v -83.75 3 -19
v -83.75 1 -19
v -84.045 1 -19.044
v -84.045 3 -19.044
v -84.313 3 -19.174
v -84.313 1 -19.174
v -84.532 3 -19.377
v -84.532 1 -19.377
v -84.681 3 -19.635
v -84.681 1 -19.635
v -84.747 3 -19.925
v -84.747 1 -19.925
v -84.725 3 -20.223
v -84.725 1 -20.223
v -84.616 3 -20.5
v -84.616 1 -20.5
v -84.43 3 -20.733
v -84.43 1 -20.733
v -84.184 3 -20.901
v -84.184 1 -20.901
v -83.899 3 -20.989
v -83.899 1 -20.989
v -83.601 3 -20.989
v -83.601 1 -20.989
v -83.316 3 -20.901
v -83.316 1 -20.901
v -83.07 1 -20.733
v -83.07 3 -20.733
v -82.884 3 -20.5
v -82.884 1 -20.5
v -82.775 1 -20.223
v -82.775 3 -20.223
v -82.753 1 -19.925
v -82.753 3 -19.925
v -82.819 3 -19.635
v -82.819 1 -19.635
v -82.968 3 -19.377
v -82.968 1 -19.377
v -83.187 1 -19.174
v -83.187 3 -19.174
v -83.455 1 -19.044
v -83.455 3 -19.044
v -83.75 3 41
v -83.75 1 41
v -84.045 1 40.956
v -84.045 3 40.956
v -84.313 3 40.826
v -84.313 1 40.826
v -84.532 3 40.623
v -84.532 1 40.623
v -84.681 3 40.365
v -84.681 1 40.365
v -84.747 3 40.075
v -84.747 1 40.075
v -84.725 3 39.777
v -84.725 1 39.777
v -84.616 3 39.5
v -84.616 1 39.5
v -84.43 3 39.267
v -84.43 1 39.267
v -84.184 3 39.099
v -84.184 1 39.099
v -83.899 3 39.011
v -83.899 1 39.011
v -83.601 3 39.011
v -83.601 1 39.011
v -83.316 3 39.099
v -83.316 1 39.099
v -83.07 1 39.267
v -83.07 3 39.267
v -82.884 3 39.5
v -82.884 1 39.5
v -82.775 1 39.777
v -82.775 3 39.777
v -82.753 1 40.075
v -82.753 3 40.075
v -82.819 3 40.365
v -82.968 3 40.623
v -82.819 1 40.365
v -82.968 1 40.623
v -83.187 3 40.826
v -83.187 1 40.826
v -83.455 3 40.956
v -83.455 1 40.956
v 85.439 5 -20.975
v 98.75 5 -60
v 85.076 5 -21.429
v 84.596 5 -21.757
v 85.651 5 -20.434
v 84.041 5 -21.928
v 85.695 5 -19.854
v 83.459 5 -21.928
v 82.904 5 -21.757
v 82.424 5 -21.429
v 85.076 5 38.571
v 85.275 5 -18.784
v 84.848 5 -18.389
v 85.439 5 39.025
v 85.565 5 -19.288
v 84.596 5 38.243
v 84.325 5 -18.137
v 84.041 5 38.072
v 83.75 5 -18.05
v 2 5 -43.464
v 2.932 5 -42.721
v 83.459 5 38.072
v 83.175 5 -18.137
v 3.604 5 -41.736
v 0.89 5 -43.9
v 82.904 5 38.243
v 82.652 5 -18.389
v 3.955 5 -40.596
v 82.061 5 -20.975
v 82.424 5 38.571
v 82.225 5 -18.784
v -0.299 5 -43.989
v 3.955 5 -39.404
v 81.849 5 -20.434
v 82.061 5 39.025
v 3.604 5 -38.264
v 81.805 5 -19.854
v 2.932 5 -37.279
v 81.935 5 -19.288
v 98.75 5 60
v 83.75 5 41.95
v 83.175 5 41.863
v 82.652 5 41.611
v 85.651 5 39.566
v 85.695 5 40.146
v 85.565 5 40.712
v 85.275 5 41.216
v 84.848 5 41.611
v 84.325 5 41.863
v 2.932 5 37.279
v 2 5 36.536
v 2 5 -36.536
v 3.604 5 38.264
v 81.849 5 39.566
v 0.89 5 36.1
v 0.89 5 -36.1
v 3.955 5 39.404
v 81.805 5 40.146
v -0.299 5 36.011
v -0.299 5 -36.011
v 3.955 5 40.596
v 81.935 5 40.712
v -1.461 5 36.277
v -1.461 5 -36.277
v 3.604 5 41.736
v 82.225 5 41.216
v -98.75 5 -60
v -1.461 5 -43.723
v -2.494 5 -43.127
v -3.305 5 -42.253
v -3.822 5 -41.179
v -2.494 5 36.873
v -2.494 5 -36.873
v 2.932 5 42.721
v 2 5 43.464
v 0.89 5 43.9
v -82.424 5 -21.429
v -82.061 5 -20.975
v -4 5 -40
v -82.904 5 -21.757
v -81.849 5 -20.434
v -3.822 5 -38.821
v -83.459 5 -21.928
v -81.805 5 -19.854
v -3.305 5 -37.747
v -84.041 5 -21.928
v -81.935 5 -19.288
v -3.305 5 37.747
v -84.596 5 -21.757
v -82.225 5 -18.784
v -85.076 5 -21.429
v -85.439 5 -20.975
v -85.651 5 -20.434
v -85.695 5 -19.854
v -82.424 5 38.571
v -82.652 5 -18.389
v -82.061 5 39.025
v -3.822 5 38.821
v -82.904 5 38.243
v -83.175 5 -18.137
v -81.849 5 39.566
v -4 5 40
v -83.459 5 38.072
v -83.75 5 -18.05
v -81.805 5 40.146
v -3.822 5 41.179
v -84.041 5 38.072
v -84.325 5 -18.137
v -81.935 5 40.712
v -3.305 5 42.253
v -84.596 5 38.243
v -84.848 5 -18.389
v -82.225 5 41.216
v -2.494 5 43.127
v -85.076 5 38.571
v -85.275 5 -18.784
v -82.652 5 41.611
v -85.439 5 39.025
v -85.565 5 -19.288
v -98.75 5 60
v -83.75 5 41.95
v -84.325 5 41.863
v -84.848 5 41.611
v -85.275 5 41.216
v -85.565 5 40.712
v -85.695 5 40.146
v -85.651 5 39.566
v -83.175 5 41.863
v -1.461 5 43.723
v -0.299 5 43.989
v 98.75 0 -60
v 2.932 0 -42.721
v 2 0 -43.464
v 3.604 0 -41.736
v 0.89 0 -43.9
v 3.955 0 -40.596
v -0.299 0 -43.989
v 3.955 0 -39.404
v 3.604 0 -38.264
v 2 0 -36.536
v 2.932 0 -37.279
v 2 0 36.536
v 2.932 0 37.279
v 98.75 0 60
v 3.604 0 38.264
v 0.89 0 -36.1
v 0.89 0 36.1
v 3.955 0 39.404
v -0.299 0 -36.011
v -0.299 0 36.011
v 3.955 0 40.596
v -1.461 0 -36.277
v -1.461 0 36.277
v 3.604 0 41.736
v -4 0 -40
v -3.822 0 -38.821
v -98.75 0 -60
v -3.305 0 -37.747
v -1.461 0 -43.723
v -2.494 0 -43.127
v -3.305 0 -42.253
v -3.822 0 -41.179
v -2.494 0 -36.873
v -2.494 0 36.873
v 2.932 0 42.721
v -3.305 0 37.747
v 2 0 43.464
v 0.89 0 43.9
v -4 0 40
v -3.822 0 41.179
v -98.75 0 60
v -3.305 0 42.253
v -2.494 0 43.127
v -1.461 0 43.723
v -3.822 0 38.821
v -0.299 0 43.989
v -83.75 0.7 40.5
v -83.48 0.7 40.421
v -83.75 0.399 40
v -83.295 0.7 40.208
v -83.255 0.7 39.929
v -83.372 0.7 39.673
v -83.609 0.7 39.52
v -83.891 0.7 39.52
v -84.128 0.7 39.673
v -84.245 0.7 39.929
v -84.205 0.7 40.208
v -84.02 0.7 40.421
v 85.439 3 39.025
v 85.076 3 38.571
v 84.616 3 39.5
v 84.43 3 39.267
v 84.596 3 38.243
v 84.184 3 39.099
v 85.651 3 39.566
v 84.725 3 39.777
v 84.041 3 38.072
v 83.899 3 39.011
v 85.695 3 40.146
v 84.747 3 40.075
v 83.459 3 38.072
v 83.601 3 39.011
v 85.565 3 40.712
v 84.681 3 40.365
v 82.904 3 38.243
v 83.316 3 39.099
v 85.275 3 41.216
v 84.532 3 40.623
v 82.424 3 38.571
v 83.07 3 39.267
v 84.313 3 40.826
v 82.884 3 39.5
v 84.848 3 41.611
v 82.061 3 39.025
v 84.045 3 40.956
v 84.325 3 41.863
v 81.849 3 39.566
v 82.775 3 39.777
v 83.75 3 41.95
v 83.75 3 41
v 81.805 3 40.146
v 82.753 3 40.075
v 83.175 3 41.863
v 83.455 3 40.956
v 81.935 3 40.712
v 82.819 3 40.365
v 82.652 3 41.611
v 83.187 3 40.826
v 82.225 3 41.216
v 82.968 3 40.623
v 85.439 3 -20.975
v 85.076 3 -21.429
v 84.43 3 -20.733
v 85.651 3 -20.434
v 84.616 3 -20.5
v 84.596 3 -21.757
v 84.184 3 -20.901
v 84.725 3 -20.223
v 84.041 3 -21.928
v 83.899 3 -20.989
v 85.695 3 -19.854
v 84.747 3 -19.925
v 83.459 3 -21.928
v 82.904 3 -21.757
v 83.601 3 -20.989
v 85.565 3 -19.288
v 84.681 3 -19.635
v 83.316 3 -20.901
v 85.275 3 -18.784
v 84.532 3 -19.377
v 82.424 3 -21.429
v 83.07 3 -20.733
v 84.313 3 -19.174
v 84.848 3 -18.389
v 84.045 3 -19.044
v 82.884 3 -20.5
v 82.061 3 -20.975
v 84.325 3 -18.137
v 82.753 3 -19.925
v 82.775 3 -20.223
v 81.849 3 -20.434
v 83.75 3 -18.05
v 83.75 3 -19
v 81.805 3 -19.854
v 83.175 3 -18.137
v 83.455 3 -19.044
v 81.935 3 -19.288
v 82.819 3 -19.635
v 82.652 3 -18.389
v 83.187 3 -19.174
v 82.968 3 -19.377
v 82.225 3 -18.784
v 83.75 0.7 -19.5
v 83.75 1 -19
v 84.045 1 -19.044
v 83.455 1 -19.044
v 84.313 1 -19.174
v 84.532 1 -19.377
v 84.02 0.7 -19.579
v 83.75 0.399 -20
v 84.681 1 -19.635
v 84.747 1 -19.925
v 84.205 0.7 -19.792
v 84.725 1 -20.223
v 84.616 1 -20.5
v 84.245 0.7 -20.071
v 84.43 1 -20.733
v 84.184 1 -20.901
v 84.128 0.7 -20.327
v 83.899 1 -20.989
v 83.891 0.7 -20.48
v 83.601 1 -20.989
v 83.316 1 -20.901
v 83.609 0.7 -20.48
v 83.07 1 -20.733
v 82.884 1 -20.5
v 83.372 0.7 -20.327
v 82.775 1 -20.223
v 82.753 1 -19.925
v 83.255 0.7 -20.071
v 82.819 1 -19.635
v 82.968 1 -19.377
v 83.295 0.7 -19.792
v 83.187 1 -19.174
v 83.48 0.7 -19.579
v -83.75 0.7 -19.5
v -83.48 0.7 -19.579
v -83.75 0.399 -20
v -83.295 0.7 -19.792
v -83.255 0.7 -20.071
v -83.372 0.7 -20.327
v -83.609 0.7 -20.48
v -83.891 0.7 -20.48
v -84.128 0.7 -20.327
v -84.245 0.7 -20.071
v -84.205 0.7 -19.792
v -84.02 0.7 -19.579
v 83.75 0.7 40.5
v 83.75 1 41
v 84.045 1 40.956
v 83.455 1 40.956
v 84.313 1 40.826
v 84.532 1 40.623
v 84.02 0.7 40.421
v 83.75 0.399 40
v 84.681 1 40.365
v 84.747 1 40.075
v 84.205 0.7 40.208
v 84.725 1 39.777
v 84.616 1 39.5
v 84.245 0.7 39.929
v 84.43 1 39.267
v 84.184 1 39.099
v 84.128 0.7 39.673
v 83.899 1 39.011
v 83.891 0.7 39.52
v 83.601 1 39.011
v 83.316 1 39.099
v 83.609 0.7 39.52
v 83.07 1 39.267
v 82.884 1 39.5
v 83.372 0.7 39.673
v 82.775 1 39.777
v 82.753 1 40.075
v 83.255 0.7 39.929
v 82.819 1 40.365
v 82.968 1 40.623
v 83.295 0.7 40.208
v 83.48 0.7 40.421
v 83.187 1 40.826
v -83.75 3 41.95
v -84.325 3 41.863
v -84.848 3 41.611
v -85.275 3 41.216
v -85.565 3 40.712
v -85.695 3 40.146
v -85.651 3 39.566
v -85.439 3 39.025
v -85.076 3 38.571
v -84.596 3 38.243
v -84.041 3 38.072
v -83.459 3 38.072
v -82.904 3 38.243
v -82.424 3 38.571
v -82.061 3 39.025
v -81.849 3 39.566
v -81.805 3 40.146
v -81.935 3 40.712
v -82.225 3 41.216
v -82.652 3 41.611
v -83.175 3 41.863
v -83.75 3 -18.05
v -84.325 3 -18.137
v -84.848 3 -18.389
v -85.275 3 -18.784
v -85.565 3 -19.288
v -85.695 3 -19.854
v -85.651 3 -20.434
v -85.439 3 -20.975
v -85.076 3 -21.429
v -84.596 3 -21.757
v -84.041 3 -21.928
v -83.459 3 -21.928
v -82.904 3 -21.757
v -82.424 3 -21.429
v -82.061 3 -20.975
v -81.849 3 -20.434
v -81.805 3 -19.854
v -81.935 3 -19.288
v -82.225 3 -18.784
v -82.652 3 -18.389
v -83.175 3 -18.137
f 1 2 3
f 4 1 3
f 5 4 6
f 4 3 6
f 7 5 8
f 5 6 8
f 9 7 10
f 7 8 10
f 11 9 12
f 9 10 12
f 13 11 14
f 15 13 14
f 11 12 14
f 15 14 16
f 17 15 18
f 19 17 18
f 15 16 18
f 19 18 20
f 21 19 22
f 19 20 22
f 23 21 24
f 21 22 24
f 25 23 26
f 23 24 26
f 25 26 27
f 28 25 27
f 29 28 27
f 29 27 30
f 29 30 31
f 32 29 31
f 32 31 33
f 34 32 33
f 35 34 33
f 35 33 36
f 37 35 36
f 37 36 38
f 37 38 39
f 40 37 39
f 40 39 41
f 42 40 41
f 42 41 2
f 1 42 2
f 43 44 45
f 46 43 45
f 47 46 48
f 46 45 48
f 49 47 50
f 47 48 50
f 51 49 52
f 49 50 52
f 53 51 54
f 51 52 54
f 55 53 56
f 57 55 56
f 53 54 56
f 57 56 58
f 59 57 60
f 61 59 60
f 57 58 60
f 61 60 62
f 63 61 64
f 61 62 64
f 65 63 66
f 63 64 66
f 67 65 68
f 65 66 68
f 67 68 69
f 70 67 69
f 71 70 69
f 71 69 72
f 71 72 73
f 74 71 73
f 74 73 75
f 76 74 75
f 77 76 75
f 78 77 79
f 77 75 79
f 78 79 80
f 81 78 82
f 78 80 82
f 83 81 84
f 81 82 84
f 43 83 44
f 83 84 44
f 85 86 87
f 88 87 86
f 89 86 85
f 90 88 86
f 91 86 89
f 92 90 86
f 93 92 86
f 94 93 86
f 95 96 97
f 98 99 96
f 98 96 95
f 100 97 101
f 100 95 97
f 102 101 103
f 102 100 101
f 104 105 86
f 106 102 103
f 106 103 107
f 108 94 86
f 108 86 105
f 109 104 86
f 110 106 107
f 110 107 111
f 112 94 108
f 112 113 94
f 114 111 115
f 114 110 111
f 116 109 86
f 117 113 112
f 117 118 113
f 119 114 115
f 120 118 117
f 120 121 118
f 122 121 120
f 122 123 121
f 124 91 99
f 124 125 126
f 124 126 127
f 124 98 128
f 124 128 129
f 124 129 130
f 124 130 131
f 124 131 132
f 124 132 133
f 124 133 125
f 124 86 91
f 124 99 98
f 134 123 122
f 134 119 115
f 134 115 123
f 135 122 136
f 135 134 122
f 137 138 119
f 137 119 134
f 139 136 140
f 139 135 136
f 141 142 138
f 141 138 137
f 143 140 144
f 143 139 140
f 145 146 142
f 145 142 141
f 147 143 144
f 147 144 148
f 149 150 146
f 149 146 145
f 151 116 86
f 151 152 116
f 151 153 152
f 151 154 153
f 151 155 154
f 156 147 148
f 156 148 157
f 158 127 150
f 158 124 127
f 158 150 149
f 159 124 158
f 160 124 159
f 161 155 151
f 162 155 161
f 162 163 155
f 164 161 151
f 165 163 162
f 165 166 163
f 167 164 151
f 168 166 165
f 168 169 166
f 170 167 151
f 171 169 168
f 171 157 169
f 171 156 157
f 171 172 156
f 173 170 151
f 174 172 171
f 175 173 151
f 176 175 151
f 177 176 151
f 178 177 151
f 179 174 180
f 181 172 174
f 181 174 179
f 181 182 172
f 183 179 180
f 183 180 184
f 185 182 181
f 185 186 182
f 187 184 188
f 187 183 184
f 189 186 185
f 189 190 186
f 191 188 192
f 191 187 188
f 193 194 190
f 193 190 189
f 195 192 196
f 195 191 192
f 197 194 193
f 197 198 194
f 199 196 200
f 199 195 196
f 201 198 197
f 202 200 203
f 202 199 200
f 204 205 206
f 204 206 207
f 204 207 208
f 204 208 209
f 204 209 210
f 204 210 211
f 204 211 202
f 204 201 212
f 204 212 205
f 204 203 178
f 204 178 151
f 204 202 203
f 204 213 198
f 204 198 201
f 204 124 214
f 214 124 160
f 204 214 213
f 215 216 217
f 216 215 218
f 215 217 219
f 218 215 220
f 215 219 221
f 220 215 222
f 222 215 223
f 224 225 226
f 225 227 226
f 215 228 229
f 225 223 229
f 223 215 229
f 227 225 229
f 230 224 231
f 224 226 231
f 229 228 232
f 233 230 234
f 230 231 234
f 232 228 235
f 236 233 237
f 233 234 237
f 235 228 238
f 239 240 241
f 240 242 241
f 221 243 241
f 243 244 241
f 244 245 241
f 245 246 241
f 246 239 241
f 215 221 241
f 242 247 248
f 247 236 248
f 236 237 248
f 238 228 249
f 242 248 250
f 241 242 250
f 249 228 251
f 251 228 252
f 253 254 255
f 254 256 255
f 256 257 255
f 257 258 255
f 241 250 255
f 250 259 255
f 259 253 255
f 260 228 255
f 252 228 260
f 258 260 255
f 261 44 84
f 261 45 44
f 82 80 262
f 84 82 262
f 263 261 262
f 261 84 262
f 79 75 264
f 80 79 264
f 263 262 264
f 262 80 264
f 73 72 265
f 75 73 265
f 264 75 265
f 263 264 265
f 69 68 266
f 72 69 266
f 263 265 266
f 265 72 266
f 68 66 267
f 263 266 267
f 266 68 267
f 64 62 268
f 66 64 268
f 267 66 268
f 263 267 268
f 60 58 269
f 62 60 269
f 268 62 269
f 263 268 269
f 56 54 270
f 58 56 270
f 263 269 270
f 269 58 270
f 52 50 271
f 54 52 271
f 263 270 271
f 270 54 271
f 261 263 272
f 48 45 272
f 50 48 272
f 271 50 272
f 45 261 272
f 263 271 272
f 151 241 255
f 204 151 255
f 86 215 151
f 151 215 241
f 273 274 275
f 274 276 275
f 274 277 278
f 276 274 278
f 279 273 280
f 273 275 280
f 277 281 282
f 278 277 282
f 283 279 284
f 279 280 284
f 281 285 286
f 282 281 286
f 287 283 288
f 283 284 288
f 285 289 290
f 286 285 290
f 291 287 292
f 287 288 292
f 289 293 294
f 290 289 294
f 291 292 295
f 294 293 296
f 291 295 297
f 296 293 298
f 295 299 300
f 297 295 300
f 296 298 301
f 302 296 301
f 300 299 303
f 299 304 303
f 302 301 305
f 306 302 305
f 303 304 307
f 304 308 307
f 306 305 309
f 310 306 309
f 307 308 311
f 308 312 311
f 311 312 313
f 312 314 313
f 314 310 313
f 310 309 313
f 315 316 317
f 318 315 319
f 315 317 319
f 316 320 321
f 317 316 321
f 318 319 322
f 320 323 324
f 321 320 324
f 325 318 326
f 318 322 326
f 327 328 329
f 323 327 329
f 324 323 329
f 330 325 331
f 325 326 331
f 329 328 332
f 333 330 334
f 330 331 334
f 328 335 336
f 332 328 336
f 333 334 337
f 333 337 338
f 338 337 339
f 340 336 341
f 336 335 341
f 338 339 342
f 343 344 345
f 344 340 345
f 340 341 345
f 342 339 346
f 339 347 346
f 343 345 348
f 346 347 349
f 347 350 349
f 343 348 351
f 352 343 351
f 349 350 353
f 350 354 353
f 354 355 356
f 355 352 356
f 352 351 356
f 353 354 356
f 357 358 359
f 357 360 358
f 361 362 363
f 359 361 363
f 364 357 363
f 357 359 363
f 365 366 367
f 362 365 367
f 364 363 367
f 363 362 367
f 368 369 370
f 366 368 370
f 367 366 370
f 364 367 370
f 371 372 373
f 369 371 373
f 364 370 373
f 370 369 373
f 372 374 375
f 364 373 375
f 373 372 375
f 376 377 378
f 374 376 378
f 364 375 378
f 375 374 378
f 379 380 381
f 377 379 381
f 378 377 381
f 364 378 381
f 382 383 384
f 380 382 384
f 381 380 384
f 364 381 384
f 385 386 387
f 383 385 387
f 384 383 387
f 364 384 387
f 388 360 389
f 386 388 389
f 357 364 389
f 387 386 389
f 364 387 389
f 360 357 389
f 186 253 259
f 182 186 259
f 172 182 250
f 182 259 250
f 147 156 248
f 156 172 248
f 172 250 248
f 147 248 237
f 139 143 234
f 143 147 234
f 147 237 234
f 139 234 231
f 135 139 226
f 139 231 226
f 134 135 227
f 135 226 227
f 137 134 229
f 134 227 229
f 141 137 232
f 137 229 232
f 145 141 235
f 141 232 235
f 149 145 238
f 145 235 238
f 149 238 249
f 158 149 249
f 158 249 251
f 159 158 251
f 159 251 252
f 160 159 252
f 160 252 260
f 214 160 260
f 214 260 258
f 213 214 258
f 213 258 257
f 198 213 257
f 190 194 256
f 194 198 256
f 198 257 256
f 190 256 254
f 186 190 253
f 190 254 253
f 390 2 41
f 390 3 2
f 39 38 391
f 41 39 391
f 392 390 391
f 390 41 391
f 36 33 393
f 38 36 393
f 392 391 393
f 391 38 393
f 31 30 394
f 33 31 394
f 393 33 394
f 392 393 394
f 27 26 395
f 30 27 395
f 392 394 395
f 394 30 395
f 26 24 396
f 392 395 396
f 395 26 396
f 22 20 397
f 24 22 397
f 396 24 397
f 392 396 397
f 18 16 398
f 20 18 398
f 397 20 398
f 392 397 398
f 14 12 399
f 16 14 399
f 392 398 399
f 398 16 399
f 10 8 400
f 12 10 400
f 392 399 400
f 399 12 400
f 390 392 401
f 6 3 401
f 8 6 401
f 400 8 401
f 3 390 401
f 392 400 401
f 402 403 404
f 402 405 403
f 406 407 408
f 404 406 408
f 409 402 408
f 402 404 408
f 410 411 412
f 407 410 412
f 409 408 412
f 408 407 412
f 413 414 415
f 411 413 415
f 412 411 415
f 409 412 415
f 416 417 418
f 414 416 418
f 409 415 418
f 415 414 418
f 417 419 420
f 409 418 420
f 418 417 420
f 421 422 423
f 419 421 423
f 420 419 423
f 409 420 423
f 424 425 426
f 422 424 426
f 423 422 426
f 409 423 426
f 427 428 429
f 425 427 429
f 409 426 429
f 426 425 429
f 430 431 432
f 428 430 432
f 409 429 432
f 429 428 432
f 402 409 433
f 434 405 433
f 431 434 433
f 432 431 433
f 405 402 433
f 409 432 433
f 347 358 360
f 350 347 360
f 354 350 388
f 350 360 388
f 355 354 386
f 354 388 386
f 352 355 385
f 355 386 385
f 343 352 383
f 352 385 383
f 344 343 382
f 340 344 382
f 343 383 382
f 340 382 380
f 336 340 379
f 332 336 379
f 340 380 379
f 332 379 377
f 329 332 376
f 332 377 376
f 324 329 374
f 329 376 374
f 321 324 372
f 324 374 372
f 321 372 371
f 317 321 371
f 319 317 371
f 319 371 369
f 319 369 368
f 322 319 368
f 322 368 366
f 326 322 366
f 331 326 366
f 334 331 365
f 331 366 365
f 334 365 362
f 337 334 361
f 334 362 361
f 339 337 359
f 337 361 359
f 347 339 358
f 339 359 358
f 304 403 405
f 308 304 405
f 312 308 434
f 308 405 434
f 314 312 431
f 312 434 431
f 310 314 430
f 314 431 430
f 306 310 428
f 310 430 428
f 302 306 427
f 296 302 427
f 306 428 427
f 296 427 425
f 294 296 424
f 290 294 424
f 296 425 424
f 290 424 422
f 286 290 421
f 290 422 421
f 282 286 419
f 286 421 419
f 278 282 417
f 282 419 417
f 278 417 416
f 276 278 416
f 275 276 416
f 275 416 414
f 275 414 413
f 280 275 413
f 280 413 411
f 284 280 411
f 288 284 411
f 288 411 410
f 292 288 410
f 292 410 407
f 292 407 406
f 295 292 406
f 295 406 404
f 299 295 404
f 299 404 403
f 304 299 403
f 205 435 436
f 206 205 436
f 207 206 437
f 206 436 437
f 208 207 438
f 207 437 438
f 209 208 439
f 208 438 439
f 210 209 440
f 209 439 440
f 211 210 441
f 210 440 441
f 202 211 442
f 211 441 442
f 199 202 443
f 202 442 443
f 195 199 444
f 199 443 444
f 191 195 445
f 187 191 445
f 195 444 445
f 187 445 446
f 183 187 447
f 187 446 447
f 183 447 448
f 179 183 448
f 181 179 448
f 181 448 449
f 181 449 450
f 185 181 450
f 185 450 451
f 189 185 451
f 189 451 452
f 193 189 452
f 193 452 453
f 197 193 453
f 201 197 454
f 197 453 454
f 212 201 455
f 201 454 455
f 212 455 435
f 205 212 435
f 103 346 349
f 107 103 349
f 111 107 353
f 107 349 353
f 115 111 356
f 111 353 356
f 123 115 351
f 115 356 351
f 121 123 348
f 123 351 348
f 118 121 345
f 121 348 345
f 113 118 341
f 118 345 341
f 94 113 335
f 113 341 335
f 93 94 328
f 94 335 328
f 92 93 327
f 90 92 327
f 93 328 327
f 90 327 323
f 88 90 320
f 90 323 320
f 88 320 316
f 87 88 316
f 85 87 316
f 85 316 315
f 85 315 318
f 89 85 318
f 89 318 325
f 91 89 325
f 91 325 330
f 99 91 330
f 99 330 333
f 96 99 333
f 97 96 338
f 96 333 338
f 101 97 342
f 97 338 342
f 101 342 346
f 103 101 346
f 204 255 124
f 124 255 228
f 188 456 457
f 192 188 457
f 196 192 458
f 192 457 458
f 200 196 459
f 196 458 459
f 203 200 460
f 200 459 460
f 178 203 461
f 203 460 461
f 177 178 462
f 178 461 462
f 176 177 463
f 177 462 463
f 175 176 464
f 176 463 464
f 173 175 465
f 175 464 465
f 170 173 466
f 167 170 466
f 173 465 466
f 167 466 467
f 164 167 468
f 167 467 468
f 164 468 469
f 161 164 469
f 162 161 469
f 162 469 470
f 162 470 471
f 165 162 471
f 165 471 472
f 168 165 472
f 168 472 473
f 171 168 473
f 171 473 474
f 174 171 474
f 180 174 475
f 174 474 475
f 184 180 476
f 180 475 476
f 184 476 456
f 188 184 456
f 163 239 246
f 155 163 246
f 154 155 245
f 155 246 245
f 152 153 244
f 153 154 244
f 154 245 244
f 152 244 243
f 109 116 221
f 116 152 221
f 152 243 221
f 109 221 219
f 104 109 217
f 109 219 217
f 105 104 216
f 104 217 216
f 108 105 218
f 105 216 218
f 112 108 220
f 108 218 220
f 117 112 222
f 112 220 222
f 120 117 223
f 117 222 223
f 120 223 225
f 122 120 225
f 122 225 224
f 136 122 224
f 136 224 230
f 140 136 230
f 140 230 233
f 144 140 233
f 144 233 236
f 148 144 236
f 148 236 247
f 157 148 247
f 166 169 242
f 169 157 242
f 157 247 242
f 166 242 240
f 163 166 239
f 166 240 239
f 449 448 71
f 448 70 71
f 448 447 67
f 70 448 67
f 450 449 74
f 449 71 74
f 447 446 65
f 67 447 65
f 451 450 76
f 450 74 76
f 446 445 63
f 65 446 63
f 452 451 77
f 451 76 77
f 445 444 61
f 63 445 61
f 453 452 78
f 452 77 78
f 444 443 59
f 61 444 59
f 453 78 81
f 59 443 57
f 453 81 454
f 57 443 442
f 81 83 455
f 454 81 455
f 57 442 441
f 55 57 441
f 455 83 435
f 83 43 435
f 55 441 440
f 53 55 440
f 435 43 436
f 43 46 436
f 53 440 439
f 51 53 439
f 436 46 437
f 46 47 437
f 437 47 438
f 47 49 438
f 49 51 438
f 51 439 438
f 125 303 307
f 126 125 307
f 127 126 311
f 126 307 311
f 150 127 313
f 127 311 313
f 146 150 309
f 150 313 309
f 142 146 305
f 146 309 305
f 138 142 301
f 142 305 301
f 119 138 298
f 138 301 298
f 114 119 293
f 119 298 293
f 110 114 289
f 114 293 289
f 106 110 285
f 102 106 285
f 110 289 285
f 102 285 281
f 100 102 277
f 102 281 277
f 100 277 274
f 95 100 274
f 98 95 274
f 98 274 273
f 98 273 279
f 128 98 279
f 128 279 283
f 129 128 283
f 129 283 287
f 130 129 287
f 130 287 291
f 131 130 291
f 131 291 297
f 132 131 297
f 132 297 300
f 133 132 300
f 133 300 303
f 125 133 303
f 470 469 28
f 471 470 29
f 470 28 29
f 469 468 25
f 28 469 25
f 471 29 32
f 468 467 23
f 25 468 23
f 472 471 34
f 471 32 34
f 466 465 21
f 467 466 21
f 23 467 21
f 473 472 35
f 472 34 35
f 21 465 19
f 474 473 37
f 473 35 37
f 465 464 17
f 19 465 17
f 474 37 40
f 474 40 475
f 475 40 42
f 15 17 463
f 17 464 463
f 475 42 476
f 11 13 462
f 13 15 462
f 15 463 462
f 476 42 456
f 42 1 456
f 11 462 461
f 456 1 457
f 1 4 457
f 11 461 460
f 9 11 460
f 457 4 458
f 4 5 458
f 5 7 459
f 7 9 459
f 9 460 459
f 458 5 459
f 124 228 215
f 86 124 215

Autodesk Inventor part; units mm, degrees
ref_plane "YZ Plane" through (0, 0, 0) normal (1, 0, 0) x (0, 1, 0)
ref_plane "XZ Plane" through (0, 0, 0) normal (0, 1, 0) x (-1, 0, 0)
ref_plane "XY Plane" through (0, 0, 0) normal (0, 0, 1) x (1, 0, 0)
sketch "Sketch1" plane through (0, 0, 0) normal (0, 1, 0) x (-1, 0, 0)
  line L0 (98.75, 60) -> (-98.75, 60)
  line L1 (-98.75, 60) -> (-98.75, -60)
  line L2 (-98.75, -60) -> (98.75, -60)
  line L3 (98.75, -60) -> (98.75, 60)
  line L4 (98.75, 60) -> (-98.75, -60) construction
  line L5 (-98.75, 60) -> (98.75, -60) construction
  circle A0 centre (0, -40) radius 4
  circle A1 centre (0, 40) radius 4
  point P0 (0, 0)
  dimension "d0" = 197.5
  dimension "d1" = 120
  dimension "d2" = 8
  dimension "d3" = 20
  dimension "d4" = 8
  dimension "d5" = 80
extrude "Extrusion1" add sketch "Sketch1" along normal blind 5
sketch "Sketch2" plane through (0, 5, 0) normal (0, 1, 0) x (1, 0, 0)
  line L0 (-98.75, 60) -> (-98.75, -60) projected
  line L1 (98.75, -60) -> (98.75, 60) projected
  line L2 (98.75, 60) -> (-98.75, 60) projected
  line L3 (-98.75, -60) -> (98.75, -60) projected
  point P0 (0, 0)
  point P1 (-83.75, 20)
  point P2 (-83.75, -40)
  point P3 (83.75, -40)
  point P4 (83.75, 20)
  dimension "d8" = 15
  dimension "d9" = 15
  dimension "d17" = 15
  dimension "d18" = 15
  dimension "d19" = 40
  dimension "d20" = 40
  dimension "d21" = 20
  dimension "d22" = 20
hole "Hole1" at (83.75, 5, -20) at (-83.75, 5, -20) at (-83.75, 5, 40) at (83.75, 5, 40) direction (0, -1, 0) diameter 2 depth 4 tip angle 118 counterbore diameter 3.9 counterbore depth 2
properties part number "panel2"
